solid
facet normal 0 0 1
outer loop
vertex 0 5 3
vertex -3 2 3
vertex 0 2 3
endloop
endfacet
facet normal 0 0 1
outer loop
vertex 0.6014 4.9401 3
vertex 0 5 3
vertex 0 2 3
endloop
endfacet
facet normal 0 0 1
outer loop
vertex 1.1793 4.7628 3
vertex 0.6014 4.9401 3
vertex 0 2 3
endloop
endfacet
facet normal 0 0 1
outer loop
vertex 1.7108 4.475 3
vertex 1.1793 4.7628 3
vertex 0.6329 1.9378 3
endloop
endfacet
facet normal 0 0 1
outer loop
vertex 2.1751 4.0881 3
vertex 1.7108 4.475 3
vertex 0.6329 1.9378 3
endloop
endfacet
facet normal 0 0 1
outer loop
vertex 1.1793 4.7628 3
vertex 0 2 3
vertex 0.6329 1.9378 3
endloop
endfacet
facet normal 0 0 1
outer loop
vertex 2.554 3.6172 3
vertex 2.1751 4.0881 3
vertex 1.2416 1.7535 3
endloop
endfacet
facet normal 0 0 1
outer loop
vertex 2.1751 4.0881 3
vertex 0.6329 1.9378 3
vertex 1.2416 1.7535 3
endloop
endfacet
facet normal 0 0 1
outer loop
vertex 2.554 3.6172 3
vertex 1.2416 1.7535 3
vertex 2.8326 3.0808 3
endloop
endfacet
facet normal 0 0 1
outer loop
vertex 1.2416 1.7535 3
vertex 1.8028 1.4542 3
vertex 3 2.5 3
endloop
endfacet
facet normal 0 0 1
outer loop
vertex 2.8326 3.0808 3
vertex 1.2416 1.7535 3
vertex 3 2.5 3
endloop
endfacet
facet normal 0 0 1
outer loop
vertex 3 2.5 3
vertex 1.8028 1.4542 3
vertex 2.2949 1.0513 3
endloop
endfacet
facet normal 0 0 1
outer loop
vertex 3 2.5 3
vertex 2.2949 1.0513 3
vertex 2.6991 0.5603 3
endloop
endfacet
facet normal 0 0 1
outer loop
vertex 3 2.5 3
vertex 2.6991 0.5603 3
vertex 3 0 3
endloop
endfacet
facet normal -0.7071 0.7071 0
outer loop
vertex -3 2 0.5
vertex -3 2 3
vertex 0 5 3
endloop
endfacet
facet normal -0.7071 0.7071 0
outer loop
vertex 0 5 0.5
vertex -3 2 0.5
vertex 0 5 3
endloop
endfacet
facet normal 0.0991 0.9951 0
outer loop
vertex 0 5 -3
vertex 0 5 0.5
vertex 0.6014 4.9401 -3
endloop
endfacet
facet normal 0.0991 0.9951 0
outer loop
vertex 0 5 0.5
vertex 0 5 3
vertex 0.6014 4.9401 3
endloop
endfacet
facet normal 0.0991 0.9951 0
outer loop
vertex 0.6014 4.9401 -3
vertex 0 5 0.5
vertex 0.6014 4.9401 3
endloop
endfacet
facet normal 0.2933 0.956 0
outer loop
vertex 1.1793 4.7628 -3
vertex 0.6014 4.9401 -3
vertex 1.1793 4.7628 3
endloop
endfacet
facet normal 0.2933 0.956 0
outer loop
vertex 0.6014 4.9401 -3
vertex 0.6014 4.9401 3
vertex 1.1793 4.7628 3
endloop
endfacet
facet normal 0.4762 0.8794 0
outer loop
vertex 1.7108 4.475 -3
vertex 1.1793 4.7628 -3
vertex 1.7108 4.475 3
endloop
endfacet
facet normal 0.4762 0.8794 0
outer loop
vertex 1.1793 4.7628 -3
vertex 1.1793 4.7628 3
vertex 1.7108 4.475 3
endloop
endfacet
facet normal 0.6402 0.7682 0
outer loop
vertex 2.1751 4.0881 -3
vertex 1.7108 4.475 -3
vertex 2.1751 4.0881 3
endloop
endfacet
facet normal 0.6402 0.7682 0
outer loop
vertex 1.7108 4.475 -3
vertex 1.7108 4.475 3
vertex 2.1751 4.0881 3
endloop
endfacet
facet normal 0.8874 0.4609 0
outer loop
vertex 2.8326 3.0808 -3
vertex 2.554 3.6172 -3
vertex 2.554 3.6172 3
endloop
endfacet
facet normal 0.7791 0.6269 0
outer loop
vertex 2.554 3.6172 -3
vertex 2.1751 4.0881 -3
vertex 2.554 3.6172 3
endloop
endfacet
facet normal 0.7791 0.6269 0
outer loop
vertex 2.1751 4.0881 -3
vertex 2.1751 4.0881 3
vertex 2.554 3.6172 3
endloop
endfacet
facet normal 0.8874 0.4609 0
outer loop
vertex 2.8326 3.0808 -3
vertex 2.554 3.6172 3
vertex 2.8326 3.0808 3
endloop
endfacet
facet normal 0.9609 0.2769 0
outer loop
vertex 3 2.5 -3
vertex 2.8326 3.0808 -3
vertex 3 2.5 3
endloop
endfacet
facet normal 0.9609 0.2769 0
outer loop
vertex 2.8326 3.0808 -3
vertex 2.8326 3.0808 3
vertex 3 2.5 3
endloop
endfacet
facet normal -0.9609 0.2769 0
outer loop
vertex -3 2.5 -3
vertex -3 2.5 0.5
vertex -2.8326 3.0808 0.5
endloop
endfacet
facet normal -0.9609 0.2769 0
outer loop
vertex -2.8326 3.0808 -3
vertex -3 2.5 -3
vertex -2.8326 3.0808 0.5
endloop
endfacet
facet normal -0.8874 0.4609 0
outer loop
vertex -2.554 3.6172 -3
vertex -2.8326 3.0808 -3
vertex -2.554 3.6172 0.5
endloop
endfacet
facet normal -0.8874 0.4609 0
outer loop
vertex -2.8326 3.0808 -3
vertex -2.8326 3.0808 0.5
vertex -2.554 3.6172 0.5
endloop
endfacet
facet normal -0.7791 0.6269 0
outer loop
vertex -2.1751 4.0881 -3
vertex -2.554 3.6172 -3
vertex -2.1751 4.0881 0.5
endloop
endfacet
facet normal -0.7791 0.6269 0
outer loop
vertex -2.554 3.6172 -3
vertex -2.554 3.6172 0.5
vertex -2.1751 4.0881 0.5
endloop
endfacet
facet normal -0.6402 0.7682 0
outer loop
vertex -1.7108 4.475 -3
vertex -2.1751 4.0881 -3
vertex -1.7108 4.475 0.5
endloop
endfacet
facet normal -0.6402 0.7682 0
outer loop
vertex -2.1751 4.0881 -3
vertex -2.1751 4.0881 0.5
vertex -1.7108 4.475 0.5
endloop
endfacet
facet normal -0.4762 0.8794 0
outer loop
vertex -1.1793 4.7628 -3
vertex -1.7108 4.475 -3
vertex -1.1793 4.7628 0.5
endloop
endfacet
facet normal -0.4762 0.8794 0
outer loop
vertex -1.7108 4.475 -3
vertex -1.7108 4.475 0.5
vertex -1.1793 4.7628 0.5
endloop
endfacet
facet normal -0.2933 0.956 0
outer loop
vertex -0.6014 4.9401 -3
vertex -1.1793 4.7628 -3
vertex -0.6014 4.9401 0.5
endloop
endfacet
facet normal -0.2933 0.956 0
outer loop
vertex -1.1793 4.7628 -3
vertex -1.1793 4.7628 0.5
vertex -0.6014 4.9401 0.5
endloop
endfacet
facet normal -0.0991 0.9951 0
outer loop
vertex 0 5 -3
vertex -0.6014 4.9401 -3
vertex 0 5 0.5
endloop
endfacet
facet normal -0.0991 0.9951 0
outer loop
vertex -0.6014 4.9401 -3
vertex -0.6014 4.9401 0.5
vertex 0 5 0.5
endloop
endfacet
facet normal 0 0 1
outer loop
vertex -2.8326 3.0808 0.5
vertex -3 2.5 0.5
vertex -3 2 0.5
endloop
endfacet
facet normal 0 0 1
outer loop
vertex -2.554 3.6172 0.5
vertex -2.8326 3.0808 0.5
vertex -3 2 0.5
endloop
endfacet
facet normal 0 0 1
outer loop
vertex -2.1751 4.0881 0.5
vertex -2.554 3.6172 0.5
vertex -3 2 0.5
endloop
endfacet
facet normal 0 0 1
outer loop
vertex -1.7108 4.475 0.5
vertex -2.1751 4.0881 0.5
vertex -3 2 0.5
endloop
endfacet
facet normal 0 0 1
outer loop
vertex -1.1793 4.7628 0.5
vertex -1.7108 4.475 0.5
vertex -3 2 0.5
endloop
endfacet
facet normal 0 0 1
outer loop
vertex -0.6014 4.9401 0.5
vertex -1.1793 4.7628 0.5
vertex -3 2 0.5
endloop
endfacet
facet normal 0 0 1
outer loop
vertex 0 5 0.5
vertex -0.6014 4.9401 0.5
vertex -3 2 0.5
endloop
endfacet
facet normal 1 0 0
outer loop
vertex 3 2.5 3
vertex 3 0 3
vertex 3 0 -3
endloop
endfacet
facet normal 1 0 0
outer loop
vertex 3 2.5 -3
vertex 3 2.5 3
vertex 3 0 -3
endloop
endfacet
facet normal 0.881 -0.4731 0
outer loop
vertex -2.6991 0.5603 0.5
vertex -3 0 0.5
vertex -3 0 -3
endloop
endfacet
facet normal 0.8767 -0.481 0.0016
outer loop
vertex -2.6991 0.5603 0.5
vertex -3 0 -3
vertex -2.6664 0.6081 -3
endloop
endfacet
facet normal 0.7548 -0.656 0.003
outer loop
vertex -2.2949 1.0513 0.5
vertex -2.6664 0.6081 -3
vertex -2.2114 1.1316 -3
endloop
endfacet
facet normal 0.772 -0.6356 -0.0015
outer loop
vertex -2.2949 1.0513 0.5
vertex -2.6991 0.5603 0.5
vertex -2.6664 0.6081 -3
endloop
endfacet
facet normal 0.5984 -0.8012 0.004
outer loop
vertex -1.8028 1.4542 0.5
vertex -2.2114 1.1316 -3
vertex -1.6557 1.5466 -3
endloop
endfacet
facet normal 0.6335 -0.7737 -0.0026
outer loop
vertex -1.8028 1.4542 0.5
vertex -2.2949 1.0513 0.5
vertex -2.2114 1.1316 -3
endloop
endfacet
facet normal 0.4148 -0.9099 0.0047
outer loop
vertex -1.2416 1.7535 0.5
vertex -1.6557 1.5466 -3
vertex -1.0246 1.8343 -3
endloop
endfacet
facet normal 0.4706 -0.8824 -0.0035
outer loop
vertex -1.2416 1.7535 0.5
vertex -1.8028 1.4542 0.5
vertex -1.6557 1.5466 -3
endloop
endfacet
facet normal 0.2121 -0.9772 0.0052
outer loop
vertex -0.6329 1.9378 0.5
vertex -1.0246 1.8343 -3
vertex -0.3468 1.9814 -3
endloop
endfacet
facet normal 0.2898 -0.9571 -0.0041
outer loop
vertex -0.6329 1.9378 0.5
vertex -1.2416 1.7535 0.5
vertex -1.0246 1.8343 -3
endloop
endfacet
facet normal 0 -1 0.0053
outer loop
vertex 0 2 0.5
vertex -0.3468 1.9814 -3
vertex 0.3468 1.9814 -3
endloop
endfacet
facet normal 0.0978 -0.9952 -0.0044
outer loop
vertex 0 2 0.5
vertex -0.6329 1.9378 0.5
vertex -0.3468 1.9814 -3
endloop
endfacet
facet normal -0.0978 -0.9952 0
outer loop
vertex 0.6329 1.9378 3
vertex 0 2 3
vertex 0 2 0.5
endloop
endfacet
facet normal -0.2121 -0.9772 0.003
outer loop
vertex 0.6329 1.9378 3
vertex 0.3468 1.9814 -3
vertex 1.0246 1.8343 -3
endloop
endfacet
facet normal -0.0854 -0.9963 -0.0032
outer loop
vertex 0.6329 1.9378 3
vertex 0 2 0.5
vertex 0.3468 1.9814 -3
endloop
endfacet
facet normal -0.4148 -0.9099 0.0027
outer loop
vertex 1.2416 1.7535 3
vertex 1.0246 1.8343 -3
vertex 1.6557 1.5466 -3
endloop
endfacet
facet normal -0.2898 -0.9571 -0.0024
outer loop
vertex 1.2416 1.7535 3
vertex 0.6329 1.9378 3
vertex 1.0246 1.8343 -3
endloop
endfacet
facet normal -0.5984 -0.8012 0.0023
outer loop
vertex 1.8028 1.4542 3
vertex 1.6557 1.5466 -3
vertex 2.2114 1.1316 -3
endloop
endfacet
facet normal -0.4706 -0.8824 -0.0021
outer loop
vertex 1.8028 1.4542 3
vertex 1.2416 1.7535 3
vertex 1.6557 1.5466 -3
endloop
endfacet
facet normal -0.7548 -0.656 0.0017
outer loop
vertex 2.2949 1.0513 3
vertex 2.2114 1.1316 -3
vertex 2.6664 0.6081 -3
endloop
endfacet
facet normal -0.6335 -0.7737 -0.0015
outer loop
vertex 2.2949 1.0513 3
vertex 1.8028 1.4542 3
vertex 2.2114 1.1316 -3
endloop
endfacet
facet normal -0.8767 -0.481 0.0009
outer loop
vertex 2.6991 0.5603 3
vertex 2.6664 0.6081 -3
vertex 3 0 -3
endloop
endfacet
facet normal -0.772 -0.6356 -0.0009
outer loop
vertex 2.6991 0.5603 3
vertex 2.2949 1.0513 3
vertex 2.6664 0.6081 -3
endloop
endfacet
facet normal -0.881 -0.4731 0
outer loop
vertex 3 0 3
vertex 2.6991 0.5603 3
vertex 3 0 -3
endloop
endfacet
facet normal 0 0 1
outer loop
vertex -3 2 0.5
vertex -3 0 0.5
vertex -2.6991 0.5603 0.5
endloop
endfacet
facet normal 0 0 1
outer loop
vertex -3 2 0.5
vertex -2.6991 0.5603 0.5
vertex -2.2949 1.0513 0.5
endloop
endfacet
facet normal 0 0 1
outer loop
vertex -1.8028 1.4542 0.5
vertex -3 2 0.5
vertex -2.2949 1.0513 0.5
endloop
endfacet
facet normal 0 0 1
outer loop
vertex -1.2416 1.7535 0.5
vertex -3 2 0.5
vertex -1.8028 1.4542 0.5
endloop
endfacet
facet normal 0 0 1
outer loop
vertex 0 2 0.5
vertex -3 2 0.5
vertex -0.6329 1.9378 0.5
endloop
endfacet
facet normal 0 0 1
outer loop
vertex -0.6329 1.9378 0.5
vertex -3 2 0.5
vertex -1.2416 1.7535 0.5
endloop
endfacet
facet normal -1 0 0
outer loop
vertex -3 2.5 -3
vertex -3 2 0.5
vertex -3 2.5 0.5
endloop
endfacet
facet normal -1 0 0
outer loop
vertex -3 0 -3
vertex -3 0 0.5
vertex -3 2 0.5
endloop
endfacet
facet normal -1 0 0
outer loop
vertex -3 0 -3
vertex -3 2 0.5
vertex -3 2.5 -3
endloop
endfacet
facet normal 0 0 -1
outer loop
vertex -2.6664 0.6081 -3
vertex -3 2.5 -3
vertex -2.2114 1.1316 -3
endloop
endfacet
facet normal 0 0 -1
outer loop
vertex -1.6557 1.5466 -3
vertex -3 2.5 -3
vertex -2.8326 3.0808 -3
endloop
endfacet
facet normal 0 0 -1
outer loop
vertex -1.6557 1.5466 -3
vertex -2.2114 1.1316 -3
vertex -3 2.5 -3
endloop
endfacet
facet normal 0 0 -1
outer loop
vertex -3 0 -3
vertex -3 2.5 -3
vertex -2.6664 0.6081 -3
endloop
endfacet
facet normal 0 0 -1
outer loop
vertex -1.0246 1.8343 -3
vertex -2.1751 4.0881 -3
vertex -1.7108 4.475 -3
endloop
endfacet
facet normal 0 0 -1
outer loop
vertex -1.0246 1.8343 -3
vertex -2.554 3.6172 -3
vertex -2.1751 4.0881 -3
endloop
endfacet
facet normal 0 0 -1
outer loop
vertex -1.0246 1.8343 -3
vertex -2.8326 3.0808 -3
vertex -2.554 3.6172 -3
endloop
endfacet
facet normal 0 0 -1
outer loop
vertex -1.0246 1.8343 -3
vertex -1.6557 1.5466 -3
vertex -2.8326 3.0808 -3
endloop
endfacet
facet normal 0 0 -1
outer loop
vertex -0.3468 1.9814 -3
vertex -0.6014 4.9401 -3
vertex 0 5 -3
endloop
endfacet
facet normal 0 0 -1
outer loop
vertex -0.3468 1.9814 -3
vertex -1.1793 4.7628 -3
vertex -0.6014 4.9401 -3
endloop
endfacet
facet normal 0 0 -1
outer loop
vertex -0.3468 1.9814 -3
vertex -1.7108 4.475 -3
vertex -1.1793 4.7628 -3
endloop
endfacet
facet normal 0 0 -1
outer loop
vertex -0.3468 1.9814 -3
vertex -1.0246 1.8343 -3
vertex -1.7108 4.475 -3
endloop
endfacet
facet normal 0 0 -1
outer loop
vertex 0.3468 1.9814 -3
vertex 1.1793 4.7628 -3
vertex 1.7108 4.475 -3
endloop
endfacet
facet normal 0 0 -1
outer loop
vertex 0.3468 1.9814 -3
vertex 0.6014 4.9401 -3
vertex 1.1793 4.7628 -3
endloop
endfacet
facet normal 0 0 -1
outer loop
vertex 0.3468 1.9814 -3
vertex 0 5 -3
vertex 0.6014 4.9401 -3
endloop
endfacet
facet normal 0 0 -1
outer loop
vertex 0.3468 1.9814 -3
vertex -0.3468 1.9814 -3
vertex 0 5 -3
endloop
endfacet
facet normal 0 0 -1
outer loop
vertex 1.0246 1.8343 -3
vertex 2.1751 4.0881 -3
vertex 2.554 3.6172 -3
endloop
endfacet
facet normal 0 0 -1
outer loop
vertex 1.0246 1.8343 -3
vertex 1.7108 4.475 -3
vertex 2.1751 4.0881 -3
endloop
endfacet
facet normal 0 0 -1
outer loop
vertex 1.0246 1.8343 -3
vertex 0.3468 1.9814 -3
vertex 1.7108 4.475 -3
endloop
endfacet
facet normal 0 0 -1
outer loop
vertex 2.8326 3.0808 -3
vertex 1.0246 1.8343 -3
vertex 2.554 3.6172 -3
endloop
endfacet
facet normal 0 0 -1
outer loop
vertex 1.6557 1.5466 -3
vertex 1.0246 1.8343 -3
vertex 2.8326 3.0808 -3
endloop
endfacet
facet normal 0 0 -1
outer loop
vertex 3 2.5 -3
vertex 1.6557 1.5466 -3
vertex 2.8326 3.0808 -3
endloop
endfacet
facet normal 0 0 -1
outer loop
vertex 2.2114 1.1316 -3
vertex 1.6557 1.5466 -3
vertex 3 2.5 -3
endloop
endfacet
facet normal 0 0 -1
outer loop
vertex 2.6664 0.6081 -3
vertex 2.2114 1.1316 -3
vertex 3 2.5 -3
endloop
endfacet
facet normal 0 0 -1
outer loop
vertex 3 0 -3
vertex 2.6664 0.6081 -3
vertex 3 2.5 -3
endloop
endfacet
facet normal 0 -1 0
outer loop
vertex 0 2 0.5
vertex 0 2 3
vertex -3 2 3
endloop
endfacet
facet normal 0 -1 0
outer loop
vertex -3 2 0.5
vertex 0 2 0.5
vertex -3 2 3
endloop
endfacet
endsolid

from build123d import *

# Parameters (mm, degrees)
SKETCH1_W           = 6
SKETCH1_H           = 6
BOSS_EXTRUDE1_DEPTH = 5
CUT_EXTRUDE4_DEPTH  = 12.5
CUT_EXTRUDE5_DEPTH  = 2.5


with BuildPart() as part:
    # Sketch1 → Boss-Extrude1 (new body)
    with BuildSketch(Plane(origin=(0, 0, 0), x_dir=(1, 0, 0), z_dir=(0, 1, 0))):
        Rectangle(SKETCH1_W, SKETCH1_H)
    extrude(amount=BOSS_EXTRUDE1_DEPTH)

    # Sketch5 → Cut-Extrude4 (cut)
    with BuildSketch(Plane.XY.offset(3)):
        with BuildLine():
            Line((-3, 5), (-3, 2.5))
            ThreePointArc((-3, 2.5), (-1.952562419, 4.293074903), (0, 5))
            Line((0, 5), (-3, 5))
        make_face()
        with BuildLine():
            ThreePointArc((0, 5), (1.952562419, 4.293074903), (3, 2.5))
            Line((3, 2.5), (3, 5))
            Line((3, 5), (0, 5))
        make_face()
        with BuildLine():
            ThreePointArc((-3, 0), (0, 2), (3, 0))
            Line((3, 0), (-3, 0))
        make_face()
    extrude(amount=-CUT_EXTRUDE4_DEPTH, mode=Mode.SUBTRACT)

    # Sketch6 → Cut-Extrude5 (cut)
    with BuildSketch(Plane.XY.offset(3)):
        with BuildLine():
            Line((-3, 2.5), (-3, 2))
            Line((-3, 2), (0, 5))
            ThreePointArc((0, 5), (-1.952562419, 4.293074903), (-3, 2.5))
        make_face()
        with BuildLine():
            Line((0, 2), (-3, 2))
            Line((-3, 2), (-3, 0))
            ThreePointArc((-3, 0), (-1.802775638, 1.454163457), (0, 2))
        make_face()
    extrude(amount=-CUT_EXTRUDE5_DEPTH, mode=Mode.SUBTRACT)


solid = part.part
